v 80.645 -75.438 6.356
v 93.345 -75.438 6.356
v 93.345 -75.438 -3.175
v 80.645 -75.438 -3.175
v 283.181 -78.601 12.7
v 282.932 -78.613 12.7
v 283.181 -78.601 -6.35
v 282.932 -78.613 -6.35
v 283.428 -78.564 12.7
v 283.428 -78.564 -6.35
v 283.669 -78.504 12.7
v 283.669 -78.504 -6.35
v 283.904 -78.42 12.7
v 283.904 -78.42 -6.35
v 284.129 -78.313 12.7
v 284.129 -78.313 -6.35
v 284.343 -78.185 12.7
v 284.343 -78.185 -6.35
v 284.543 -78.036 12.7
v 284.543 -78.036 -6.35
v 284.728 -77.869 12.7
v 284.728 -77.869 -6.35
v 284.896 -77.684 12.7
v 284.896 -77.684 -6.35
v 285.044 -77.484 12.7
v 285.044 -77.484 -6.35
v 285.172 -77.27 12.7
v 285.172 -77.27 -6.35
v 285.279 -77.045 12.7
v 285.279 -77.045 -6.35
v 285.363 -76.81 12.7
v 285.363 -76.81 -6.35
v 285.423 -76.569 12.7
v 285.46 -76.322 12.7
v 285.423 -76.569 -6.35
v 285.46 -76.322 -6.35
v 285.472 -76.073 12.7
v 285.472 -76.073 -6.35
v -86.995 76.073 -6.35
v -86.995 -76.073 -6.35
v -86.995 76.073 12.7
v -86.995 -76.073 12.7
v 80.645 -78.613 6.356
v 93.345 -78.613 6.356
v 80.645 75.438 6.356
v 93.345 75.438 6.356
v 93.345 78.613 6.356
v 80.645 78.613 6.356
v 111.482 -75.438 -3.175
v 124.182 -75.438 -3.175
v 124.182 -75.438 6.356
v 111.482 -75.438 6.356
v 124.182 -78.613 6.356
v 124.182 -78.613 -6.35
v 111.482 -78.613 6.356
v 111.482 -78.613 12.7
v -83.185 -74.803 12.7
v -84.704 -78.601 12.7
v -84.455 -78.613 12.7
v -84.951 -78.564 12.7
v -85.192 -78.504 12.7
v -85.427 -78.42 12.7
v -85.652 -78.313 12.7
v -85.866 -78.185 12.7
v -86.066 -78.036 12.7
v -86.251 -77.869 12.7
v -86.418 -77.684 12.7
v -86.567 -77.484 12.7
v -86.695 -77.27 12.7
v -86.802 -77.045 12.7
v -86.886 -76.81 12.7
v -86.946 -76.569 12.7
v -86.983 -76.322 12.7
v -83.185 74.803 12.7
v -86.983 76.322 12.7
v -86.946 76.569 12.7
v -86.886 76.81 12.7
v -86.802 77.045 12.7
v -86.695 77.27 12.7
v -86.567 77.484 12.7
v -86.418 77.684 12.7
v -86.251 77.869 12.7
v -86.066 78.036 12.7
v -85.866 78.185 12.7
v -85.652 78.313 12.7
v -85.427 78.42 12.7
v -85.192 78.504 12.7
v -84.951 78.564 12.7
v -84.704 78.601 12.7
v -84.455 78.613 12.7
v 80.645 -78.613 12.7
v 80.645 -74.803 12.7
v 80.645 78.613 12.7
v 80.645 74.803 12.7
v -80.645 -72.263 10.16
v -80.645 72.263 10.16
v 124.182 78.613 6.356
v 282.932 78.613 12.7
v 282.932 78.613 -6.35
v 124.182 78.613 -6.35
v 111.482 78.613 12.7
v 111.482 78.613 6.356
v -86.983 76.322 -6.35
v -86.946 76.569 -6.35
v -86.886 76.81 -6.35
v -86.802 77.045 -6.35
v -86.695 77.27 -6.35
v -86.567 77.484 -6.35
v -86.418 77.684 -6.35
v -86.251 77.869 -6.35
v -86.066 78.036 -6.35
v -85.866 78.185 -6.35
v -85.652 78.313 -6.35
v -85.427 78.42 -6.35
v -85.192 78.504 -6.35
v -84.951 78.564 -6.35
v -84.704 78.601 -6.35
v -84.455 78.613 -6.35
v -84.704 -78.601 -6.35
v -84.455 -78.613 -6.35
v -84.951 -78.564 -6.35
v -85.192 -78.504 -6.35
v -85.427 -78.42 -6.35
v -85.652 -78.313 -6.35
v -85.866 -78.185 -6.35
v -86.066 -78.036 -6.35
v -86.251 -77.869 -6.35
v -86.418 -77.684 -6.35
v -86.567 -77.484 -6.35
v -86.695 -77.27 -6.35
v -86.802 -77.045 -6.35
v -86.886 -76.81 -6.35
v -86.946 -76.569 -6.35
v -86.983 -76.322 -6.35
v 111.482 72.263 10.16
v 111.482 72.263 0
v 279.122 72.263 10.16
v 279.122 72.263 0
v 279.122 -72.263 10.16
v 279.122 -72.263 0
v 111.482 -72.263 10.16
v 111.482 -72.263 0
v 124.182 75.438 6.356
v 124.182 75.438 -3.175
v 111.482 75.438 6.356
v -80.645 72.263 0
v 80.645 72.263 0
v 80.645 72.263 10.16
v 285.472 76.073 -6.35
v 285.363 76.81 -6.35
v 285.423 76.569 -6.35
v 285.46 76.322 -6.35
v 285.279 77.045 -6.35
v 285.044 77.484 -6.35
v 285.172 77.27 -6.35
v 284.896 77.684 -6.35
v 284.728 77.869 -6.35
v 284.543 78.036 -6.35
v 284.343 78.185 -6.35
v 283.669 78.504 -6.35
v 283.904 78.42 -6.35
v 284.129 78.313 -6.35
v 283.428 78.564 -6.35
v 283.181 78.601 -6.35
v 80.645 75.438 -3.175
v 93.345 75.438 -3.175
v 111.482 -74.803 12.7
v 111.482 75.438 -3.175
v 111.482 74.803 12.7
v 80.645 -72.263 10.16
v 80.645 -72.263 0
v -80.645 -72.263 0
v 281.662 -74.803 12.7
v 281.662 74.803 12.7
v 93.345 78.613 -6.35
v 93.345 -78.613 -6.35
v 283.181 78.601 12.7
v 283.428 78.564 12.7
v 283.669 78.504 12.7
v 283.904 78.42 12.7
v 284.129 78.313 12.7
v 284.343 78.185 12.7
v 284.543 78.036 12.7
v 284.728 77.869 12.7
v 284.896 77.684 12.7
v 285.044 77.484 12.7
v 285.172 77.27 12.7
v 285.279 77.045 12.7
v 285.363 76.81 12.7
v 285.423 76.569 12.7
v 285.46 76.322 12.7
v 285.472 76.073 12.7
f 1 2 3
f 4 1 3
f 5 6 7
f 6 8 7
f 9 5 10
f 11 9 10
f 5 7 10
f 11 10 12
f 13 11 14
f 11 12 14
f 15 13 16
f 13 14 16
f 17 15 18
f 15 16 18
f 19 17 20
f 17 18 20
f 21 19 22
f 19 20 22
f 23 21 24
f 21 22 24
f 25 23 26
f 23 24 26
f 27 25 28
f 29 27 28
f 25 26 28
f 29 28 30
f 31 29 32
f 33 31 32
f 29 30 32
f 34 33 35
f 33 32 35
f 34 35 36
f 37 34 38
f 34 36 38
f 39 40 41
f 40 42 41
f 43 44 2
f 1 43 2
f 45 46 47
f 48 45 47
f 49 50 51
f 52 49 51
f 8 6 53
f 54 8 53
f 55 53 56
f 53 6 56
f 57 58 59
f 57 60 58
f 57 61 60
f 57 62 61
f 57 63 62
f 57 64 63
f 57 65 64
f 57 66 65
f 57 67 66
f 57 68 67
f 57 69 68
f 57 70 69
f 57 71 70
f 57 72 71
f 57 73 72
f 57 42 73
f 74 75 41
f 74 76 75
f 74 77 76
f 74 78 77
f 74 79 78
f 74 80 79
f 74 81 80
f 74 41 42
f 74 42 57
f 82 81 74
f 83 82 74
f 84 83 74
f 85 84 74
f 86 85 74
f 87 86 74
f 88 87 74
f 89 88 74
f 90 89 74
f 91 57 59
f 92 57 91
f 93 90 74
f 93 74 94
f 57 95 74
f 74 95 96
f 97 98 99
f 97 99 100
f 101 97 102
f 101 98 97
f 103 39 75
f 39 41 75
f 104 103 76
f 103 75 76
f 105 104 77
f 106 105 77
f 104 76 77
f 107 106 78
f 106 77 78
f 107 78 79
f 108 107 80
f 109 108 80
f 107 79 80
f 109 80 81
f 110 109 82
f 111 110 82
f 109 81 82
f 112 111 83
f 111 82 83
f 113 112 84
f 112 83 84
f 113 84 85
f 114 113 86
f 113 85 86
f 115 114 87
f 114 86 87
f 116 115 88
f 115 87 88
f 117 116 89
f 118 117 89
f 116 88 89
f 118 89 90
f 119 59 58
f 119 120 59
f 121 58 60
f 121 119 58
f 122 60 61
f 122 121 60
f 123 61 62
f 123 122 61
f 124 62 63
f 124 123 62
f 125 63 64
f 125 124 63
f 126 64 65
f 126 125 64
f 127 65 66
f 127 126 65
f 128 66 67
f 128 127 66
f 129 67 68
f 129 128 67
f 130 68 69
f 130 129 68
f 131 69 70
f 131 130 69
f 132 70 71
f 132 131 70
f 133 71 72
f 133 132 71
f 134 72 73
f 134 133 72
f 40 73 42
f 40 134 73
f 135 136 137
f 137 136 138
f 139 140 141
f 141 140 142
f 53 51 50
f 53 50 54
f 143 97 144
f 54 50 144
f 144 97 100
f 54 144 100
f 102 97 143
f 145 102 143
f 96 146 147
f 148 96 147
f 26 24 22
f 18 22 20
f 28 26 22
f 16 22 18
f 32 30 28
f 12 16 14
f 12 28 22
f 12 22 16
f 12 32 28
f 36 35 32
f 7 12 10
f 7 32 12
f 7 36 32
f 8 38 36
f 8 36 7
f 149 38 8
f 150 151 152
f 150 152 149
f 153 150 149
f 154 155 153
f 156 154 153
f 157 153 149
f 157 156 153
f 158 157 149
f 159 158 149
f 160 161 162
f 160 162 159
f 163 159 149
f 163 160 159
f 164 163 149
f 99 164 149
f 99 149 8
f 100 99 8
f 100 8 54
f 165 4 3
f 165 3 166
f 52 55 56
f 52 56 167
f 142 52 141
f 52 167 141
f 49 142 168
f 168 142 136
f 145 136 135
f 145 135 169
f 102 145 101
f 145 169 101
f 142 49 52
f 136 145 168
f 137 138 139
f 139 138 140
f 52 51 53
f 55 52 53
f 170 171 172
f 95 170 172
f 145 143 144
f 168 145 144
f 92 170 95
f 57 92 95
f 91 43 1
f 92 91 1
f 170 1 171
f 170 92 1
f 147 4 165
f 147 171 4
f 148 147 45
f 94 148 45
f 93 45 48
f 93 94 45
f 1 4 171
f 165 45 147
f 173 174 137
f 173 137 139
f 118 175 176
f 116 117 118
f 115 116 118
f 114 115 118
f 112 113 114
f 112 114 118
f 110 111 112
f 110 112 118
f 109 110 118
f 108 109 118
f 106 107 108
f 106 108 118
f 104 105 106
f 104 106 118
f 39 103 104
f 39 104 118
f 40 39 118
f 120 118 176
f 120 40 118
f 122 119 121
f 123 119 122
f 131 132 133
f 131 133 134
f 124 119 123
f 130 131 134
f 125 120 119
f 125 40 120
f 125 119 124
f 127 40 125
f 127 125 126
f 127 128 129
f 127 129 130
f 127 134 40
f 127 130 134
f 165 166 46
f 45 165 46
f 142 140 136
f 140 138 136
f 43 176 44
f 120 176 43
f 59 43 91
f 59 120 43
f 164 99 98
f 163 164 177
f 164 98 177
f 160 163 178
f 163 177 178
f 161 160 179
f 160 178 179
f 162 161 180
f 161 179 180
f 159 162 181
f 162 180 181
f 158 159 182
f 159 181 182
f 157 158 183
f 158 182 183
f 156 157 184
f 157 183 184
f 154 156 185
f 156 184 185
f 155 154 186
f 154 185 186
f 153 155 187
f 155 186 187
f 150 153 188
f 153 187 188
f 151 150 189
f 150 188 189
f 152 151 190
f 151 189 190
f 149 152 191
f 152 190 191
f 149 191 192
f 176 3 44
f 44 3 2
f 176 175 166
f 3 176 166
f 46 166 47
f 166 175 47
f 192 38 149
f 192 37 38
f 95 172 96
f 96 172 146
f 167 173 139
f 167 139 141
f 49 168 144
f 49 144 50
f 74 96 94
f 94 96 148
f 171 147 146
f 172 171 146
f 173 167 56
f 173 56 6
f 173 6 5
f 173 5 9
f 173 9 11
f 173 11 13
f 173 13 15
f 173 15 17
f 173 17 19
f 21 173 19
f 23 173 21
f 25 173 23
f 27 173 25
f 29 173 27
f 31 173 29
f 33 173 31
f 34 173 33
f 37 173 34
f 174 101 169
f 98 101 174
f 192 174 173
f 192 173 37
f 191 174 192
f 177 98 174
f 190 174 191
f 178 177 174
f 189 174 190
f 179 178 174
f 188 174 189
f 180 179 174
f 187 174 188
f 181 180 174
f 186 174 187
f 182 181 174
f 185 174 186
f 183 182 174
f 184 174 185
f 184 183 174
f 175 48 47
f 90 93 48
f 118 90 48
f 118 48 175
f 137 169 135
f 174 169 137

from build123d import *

# Parameters (mm, degrees)
BOSS_EXTRUDE1_DEPTH = 12.7
SKETCH2_W           = 167.64
SKETCH2_H           = 157.226
BOSS_EXTRUDE2_DEPTH = 6.35
FILLET1_R           = 2.54
FILLET2_SIZE        = 2.54
BOSS_EXTRUDE6_DEPTH = 12.7
SKETCH8_W           = 173.99
SKETCH8_H           = 157.226
BOSS_EXTRUDE7_DEPTH = 6.35
CHAMFER1_SIZE       = 2.54
FILLET4_R           = 2.54
BOSS_EXTRUDE8_DEPTH = 12.7
CUT_EXTRUDE1_DEPTH  = 12.7


with BuildPart() as part:
    # Sketch1 → Boss-Extrude1 (new body)
    with BuildSketch(Plane.XY):
        Polygon((-80.645, 72.263), (80.645, 72.263), (80.645, 78.613), (-86.995, 78.613), (-86.995, -78.613), (80.645, -78.613), (80.645, -72.263), (-80.645, -72.263), align=None)
    extrude(amount=BOSS_EXTRUDE1_DEPTH)

    # Sketch2 → Boss-Extrude2 (add)
    with BuildSketch(Plane(origin=(0, 0, 0), x_dir=(-1, 0, 0), z_dir=(0, 0, -1))):
        with Locations((3.175, 0)):
            Rectangle(SKETCH2_W, SKETCH2_H)
    extrude(amount=BOSS_EXTRUDE2_DEPTH)

    # Fillet1
    fillet1_edges = [part.edges().sort_by_distance(p)[0] for p in [
        (-86.995, -78.613, 3.175),
        (-86.995, 78.613, 3.175),
    ]]
    fillet(fillet1_edges, radius=FILLET1_R)

    # Fillet2
    fillet2_edges = [part.edges().sort_by_distance(p)[0] for p in [
        (0, -72.263, 12.7),
        (-80.645, 0, 12.7),
        (0, 72.263, 12.7),
    ]]
    chamfer(fillet2_edges, length=FILLET2_SIZE)

    # Sketch9 → Boss-Extrude8 (add)
    with BuildSketch(Plane(origin=(80.645, 0, 0), x_dir=(0, 0, -1), z_dir=(1, 0, 0))):
        Polygon((6.35, -78.613), (-6.355883999, -78.613), (-6.355883999, -75.438), (3.175, -75.438), (3.175, 75.438), (-6.355883999, 75.438), (-6.355883999, 78.613), (6.35, 78.613), align=None)
    extrude(amount=BOSS_EXTRUDE8_DEPTH)


with BuildPart() as body_2:
    # Sketch7 → Boss-Extrude6 (new body)
    with BuildSketch(Plane.XY):
        Polygon((285.472121408, 78.613), (111.482121408, 78.613), (111.482121408, 72.263), (279.122121408, 72.263), (279.122121408, -72.263), (111.482121408, -72.263), (111.482121408, -78.613), (285.472121408, -78.613), align=None)
    extrude(amount=BOSS_EXTRUDE6_DEPTH)

    # Sketch8 → Boss-Extrude7 (add)
    with BuildSketch(Plane(origin=(0, 0, 0), x_dir=(-1, 0, 0), z_dir=(0, 0, -1))):
        with Locations((-198.477121408, 0)):
            Rectangle(SKETCH8_W, SKETCH8_H)
    extrude(amount=BOSS_EXTRUDE7_DEPTH)

    # Chamfer1
    chamfer1_edges = [body_2.edges().sort_by_distance(p)[0] for p in [
        (279.122121408, 0, 12.7),
        (195.302121408, -72.263, 12.7),
        (195.302121408, 72.263, 12.7),
    ]]
    chamfer(chamfer1_edges, length=CHAMFER1_SIZE)

    # Fillet4
    fillet4_edges = [body_2.edges().sort_by_distance(p)[0] for p in [
        (285.472121408, 78.613, 3.175),
        (285.472121408, -78.613, 3.175),
    ]]
    fillet(fillet4_edges, radius=FILLET4_R)

    # Sketch10 → Cut-Extrude1 (cut)
    with BuildSketch(Plane.ZY.offset(-111.482121408)):
        Polygon((-6.35, 78.613), (6.355883999, 78.613), (6.355883999, 75.438), (-3.175, 75.438), (-3.175, -75.438), (6.355883999, -75.438), (6.355883999, -78.613), (-6.35, -78.613), align=None)
    extrude(amount=-CUT_EXTRUDE1_DEPTH, mode=Mode.SUBTRACT)


solid = Compound([part.part, body_2.part])
